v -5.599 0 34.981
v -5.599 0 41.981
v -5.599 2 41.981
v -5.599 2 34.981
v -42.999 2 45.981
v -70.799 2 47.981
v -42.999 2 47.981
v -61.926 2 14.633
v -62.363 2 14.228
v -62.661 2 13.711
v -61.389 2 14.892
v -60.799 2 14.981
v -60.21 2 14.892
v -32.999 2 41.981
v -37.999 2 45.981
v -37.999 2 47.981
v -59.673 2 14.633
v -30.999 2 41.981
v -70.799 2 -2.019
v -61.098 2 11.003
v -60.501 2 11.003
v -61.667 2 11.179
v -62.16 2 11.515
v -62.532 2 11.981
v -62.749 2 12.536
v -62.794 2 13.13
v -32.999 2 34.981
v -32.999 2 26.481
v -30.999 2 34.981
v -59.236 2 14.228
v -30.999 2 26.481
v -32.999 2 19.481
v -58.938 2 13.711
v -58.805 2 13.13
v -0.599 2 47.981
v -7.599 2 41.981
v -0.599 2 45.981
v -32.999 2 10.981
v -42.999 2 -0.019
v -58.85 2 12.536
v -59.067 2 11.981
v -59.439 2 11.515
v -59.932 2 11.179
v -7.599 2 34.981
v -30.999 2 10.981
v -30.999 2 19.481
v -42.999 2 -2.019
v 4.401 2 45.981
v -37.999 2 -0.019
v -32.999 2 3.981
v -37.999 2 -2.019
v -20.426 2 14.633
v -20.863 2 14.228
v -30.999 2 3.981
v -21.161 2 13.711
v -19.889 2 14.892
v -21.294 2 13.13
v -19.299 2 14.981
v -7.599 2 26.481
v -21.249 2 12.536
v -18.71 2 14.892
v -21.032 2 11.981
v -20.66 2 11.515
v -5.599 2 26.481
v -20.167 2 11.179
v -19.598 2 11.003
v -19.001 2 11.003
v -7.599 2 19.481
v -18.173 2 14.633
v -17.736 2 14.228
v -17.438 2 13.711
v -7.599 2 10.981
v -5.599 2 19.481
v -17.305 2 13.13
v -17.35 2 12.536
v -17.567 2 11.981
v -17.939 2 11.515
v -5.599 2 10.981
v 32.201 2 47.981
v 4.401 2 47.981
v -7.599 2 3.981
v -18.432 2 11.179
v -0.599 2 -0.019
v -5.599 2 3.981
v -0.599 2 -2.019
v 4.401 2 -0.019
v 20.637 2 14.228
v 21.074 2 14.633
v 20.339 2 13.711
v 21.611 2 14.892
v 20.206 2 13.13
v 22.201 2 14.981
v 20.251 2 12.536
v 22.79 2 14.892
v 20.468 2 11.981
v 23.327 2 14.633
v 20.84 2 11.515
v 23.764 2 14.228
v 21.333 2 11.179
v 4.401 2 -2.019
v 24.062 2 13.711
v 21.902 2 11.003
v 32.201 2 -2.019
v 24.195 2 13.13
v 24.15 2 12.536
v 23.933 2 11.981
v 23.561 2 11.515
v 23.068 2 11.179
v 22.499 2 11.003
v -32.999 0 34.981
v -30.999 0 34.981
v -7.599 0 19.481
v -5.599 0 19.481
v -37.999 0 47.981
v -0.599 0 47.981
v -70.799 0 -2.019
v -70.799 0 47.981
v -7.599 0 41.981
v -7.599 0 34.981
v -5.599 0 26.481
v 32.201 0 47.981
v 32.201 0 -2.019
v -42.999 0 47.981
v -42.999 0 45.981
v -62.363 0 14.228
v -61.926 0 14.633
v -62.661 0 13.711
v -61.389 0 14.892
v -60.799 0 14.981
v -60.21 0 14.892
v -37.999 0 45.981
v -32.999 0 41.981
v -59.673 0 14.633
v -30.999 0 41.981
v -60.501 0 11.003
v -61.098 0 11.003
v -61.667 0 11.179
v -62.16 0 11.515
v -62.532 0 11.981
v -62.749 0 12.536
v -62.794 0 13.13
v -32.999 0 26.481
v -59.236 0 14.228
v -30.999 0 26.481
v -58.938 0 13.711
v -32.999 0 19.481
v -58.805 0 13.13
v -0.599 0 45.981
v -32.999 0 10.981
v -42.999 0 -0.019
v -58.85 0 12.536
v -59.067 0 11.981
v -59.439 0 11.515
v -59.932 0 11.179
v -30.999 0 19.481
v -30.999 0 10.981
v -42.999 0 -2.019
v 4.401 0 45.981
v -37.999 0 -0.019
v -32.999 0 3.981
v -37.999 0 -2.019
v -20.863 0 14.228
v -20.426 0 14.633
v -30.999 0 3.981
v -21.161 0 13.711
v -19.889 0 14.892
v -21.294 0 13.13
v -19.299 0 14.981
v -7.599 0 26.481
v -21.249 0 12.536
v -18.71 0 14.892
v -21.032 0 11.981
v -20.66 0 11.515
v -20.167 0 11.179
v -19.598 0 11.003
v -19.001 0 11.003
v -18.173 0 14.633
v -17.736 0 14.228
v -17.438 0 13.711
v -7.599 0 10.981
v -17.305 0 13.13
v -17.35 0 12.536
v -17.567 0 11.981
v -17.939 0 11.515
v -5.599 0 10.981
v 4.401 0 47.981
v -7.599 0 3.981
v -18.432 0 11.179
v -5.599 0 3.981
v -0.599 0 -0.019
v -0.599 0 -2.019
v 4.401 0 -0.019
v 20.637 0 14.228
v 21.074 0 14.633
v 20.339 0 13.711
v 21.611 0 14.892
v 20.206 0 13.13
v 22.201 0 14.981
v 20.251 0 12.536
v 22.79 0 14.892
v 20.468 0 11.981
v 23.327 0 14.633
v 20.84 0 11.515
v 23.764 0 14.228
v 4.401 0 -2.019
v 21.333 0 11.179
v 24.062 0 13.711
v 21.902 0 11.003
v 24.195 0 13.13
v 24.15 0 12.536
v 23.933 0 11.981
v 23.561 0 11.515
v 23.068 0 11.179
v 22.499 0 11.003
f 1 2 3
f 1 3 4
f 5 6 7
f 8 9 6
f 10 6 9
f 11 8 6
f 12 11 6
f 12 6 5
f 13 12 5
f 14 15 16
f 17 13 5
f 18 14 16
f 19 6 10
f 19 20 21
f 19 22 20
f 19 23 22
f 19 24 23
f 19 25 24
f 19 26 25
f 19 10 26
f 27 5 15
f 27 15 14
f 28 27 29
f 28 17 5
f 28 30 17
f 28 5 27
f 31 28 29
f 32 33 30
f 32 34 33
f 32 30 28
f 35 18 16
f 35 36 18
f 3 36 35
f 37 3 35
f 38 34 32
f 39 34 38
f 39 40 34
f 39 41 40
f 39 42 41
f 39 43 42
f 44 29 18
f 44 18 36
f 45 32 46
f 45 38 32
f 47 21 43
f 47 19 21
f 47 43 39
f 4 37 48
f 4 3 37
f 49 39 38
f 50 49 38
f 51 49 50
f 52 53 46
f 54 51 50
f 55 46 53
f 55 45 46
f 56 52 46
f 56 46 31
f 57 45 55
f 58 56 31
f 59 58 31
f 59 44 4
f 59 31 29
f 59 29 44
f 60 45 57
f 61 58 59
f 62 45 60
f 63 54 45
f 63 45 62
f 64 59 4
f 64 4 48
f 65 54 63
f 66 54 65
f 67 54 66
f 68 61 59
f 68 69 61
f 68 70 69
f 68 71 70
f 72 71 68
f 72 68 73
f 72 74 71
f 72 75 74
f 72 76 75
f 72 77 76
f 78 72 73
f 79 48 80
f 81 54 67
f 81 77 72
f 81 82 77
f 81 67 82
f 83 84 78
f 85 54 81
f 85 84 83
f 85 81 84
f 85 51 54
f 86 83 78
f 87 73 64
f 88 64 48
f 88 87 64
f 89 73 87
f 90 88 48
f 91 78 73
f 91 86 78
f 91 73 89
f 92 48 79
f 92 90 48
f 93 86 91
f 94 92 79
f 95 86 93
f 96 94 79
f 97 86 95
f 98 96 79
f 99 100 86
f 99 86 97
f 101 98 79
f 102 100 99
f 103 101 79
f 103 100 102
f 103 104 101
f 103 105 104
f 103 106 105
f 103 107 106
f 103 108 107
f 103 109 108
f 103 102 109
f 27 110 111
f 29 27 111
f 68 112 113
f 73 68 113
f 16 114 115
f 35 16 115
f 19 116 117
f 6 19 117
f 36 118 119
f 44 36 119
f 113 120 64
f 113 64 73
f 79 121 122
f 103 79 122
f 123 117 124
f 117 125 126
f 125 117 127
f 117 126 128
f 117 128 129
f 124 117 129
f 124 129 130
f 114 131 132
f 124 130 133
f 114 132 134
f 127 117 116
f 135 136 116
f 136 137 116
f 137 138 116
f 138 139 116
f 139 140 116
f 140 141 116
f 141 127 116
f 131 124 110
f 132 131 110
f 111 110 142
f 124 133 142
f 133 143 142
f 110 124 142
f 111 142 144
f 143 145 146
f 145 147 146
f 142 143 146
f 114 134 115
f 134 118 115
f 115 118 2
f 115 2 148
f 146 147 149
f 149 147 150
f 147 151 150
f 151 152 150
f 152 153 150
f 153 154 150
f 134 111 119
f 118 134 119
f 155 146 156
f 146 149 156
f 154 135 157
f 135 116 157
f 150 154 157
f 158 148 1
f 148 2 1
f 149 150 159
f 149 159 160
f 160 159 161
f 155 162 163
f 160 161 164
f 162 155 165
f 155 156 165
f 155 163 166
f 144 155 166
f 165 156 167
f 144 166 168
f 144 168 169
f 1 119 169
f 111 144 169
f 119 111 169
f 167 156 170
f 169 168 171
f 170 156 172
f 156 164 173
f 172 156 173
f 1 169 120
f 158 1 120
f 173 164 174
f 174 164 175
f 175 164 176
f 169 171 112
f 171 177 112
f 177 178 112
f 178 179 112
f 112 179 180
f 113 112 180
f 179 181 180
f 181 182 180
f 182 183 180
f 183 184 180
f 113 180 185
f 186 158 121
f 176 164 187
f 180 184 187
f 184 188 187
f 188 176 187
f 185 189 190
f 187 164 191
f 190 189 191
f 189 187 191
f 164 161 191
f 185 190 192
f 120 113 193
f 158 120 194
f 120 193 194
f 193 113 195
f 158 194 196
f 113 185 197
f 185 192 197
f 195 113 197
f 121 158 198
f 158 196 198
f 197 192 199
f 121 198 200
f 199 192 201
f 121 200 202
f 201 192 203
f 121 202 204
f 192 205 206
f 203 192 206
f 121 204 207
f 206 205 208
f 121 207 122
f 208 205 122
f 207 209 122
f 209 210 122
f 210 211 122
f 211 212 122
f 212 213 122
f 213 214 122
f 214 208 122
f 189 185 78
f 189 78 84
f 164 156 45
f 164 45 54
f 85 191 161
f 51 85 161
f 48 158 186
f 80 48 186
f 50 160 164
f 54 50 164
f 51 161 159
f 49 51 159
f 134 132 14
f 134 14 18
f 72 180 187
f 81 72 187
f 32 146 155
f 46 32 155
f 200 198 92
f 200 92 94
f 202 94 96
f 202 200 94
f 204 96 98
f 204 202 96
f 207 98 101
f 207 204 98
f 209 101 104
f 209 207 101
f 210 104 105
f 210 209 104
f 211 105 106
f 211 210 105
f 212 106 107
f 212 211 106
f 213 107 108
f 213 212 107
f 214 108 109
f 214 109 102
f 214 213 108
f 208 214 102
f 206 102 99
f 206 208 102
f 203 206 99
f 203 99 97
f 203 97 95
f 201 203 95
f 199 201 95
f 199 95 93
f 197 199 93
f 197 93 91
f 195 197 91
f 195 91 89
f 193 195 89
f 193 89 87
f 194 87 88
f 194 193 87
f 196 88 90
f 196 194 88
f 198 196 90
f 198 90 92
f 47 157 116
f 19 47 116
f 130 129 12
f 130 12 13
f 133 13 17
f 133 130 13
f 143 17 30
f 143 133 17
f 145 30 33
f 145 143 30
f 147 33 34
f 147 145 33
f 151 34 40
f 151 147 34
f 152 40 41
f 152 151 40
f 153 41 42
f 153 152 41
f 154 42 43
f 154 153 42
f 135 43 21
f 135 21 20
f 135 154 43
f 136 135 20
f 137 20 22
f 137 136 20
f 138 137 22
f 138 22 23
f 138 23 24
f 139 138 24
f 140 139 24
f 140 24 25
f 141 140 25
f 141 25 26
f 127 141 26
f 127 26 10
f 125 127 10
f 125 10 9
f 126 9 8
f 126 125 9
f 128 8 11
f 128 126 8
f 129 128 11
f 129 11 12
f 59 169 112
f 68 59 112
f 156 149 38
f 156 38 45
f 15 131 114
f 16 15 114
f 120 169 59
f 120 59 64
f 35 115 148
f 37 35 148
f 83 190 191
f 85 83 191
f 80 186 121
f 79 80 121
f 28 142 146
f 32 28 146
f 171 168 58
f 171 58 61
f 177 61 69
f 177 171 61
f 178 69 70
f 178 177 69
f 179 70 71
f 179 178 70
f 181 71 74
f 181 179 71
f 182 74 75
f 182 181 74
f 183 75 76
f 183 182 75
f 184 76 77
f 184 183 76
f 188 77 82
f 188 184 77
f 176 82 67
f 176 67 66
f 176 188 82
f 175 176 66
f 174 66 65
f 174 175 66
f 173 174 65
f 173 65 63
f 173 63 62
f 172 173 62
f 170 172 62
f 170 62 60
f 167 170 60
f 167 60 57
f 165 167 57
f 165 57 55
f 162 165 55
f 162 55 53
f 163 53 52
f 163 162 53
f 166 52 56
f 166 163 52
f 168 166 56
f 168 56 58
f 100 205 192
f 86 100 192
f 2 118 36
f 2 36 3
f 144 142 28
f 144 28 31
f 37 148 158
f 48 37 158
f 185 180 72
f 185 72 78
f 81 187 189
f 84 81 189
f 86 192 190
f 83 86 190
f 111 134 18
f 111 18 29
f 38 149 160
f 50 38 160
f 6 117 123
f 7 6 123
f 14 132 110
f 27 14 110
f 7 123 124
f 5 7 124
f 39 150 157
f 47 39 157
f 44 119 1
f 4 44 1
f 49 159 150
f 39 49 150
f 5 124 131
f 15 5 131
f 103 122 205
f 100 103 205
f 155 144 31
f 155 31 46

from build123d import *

# Parameters (mm, degrees)
SKETCH1_W           = 2
SKETCH1_H           = 7
SKETCH1_R           = 2
BOSS_EXTRUDE1_DEPTH = 2


with BuildPart() as part:
    # Sketch1 → Boss-Extrude1 (new body)
    with BuildSketch(Plane(origin=(0, 0, 0), x_dir=(1, 0, 0), z_dir=(0, 1, 0))):
        Polygon((-42.999453113, 2.019339096), (-70.799453113, 2.019339096), (-70.799453113, -47.980660904), (-42.999453113, -47.980660904), (-42.999453113, -45.980660904), (-37.999453113, -45.980660904), (-37.999453113, -47.980660904), (-0.599453113, -47.980660904), (-0.599453113, -45.980660904), (4.400546887, -45.980660904), (4.400546887, -47.980660904), (32.200546887, -47.980660904), (32.200546887, 2.019339096), (4.400546887, 2.019339096), (4.400546887, 0.019339096), (-0.599453113, 0.019339096), (-0.599453113, 2.019339096), (-37.999453113, 2.019339096), (-37.999453113, 0.019339096), (-42.999453113, 0.019339096), align=None)
        with Locations((-31.999453113, -38.480660904)):
            Rectangle(SKETCH1_W, SKETCH1_H, mode=Mode.SUBTRACT)
        with Locations((-6.599453113, -38.480660904)):
            Rectangle(SKETCH1_W, SKETCH1_H, mode=Mode.SUBTRACT)
        with Locations(Location((-60.799453113, -12.980660904, 0), (0, 0, 270))):
            Circle(SKETCH1_R, mode=Mode.SUBTRACT)
        with Locations((-31.999453113, -22.980660904)):
            Rectangle(SKETCH1_W, SKETCH1_H, mode=Mode.SUBTRACT)
        with Locations(Location((-19.299453113, -12.980660904, 0), (0, 0, 270))):
            Circle(SKETCH1_R, mode=Mode.SUBTRACT)
        with Locations((-31.999453113, -7.480660904)):
            Rectangle(SKETCH1_W, SKETCH1_H, mode=Mode.SUBTRACT)
        with Locations((-6.599453113, -22.980660904)):
            Rectangle(SKETCH1_W, SKETCH1_H, mode=Mode.SUBTRACT)
        with Locations(Location((22.200546887, -12.980660904, 0), (0, 0, 270))):
            Circle(SKETCH1_R, mode=Mode.SUBTRACT)
        with Locations((-6.599453113, -7.480660904)):
            Rectangle(SKETCH1_W, SKETCH1_H, mode=Mode.SUBTRACT)
    extrude(amount=BOSS_EXTRUDE1_DEPTH)


solid = part.part
